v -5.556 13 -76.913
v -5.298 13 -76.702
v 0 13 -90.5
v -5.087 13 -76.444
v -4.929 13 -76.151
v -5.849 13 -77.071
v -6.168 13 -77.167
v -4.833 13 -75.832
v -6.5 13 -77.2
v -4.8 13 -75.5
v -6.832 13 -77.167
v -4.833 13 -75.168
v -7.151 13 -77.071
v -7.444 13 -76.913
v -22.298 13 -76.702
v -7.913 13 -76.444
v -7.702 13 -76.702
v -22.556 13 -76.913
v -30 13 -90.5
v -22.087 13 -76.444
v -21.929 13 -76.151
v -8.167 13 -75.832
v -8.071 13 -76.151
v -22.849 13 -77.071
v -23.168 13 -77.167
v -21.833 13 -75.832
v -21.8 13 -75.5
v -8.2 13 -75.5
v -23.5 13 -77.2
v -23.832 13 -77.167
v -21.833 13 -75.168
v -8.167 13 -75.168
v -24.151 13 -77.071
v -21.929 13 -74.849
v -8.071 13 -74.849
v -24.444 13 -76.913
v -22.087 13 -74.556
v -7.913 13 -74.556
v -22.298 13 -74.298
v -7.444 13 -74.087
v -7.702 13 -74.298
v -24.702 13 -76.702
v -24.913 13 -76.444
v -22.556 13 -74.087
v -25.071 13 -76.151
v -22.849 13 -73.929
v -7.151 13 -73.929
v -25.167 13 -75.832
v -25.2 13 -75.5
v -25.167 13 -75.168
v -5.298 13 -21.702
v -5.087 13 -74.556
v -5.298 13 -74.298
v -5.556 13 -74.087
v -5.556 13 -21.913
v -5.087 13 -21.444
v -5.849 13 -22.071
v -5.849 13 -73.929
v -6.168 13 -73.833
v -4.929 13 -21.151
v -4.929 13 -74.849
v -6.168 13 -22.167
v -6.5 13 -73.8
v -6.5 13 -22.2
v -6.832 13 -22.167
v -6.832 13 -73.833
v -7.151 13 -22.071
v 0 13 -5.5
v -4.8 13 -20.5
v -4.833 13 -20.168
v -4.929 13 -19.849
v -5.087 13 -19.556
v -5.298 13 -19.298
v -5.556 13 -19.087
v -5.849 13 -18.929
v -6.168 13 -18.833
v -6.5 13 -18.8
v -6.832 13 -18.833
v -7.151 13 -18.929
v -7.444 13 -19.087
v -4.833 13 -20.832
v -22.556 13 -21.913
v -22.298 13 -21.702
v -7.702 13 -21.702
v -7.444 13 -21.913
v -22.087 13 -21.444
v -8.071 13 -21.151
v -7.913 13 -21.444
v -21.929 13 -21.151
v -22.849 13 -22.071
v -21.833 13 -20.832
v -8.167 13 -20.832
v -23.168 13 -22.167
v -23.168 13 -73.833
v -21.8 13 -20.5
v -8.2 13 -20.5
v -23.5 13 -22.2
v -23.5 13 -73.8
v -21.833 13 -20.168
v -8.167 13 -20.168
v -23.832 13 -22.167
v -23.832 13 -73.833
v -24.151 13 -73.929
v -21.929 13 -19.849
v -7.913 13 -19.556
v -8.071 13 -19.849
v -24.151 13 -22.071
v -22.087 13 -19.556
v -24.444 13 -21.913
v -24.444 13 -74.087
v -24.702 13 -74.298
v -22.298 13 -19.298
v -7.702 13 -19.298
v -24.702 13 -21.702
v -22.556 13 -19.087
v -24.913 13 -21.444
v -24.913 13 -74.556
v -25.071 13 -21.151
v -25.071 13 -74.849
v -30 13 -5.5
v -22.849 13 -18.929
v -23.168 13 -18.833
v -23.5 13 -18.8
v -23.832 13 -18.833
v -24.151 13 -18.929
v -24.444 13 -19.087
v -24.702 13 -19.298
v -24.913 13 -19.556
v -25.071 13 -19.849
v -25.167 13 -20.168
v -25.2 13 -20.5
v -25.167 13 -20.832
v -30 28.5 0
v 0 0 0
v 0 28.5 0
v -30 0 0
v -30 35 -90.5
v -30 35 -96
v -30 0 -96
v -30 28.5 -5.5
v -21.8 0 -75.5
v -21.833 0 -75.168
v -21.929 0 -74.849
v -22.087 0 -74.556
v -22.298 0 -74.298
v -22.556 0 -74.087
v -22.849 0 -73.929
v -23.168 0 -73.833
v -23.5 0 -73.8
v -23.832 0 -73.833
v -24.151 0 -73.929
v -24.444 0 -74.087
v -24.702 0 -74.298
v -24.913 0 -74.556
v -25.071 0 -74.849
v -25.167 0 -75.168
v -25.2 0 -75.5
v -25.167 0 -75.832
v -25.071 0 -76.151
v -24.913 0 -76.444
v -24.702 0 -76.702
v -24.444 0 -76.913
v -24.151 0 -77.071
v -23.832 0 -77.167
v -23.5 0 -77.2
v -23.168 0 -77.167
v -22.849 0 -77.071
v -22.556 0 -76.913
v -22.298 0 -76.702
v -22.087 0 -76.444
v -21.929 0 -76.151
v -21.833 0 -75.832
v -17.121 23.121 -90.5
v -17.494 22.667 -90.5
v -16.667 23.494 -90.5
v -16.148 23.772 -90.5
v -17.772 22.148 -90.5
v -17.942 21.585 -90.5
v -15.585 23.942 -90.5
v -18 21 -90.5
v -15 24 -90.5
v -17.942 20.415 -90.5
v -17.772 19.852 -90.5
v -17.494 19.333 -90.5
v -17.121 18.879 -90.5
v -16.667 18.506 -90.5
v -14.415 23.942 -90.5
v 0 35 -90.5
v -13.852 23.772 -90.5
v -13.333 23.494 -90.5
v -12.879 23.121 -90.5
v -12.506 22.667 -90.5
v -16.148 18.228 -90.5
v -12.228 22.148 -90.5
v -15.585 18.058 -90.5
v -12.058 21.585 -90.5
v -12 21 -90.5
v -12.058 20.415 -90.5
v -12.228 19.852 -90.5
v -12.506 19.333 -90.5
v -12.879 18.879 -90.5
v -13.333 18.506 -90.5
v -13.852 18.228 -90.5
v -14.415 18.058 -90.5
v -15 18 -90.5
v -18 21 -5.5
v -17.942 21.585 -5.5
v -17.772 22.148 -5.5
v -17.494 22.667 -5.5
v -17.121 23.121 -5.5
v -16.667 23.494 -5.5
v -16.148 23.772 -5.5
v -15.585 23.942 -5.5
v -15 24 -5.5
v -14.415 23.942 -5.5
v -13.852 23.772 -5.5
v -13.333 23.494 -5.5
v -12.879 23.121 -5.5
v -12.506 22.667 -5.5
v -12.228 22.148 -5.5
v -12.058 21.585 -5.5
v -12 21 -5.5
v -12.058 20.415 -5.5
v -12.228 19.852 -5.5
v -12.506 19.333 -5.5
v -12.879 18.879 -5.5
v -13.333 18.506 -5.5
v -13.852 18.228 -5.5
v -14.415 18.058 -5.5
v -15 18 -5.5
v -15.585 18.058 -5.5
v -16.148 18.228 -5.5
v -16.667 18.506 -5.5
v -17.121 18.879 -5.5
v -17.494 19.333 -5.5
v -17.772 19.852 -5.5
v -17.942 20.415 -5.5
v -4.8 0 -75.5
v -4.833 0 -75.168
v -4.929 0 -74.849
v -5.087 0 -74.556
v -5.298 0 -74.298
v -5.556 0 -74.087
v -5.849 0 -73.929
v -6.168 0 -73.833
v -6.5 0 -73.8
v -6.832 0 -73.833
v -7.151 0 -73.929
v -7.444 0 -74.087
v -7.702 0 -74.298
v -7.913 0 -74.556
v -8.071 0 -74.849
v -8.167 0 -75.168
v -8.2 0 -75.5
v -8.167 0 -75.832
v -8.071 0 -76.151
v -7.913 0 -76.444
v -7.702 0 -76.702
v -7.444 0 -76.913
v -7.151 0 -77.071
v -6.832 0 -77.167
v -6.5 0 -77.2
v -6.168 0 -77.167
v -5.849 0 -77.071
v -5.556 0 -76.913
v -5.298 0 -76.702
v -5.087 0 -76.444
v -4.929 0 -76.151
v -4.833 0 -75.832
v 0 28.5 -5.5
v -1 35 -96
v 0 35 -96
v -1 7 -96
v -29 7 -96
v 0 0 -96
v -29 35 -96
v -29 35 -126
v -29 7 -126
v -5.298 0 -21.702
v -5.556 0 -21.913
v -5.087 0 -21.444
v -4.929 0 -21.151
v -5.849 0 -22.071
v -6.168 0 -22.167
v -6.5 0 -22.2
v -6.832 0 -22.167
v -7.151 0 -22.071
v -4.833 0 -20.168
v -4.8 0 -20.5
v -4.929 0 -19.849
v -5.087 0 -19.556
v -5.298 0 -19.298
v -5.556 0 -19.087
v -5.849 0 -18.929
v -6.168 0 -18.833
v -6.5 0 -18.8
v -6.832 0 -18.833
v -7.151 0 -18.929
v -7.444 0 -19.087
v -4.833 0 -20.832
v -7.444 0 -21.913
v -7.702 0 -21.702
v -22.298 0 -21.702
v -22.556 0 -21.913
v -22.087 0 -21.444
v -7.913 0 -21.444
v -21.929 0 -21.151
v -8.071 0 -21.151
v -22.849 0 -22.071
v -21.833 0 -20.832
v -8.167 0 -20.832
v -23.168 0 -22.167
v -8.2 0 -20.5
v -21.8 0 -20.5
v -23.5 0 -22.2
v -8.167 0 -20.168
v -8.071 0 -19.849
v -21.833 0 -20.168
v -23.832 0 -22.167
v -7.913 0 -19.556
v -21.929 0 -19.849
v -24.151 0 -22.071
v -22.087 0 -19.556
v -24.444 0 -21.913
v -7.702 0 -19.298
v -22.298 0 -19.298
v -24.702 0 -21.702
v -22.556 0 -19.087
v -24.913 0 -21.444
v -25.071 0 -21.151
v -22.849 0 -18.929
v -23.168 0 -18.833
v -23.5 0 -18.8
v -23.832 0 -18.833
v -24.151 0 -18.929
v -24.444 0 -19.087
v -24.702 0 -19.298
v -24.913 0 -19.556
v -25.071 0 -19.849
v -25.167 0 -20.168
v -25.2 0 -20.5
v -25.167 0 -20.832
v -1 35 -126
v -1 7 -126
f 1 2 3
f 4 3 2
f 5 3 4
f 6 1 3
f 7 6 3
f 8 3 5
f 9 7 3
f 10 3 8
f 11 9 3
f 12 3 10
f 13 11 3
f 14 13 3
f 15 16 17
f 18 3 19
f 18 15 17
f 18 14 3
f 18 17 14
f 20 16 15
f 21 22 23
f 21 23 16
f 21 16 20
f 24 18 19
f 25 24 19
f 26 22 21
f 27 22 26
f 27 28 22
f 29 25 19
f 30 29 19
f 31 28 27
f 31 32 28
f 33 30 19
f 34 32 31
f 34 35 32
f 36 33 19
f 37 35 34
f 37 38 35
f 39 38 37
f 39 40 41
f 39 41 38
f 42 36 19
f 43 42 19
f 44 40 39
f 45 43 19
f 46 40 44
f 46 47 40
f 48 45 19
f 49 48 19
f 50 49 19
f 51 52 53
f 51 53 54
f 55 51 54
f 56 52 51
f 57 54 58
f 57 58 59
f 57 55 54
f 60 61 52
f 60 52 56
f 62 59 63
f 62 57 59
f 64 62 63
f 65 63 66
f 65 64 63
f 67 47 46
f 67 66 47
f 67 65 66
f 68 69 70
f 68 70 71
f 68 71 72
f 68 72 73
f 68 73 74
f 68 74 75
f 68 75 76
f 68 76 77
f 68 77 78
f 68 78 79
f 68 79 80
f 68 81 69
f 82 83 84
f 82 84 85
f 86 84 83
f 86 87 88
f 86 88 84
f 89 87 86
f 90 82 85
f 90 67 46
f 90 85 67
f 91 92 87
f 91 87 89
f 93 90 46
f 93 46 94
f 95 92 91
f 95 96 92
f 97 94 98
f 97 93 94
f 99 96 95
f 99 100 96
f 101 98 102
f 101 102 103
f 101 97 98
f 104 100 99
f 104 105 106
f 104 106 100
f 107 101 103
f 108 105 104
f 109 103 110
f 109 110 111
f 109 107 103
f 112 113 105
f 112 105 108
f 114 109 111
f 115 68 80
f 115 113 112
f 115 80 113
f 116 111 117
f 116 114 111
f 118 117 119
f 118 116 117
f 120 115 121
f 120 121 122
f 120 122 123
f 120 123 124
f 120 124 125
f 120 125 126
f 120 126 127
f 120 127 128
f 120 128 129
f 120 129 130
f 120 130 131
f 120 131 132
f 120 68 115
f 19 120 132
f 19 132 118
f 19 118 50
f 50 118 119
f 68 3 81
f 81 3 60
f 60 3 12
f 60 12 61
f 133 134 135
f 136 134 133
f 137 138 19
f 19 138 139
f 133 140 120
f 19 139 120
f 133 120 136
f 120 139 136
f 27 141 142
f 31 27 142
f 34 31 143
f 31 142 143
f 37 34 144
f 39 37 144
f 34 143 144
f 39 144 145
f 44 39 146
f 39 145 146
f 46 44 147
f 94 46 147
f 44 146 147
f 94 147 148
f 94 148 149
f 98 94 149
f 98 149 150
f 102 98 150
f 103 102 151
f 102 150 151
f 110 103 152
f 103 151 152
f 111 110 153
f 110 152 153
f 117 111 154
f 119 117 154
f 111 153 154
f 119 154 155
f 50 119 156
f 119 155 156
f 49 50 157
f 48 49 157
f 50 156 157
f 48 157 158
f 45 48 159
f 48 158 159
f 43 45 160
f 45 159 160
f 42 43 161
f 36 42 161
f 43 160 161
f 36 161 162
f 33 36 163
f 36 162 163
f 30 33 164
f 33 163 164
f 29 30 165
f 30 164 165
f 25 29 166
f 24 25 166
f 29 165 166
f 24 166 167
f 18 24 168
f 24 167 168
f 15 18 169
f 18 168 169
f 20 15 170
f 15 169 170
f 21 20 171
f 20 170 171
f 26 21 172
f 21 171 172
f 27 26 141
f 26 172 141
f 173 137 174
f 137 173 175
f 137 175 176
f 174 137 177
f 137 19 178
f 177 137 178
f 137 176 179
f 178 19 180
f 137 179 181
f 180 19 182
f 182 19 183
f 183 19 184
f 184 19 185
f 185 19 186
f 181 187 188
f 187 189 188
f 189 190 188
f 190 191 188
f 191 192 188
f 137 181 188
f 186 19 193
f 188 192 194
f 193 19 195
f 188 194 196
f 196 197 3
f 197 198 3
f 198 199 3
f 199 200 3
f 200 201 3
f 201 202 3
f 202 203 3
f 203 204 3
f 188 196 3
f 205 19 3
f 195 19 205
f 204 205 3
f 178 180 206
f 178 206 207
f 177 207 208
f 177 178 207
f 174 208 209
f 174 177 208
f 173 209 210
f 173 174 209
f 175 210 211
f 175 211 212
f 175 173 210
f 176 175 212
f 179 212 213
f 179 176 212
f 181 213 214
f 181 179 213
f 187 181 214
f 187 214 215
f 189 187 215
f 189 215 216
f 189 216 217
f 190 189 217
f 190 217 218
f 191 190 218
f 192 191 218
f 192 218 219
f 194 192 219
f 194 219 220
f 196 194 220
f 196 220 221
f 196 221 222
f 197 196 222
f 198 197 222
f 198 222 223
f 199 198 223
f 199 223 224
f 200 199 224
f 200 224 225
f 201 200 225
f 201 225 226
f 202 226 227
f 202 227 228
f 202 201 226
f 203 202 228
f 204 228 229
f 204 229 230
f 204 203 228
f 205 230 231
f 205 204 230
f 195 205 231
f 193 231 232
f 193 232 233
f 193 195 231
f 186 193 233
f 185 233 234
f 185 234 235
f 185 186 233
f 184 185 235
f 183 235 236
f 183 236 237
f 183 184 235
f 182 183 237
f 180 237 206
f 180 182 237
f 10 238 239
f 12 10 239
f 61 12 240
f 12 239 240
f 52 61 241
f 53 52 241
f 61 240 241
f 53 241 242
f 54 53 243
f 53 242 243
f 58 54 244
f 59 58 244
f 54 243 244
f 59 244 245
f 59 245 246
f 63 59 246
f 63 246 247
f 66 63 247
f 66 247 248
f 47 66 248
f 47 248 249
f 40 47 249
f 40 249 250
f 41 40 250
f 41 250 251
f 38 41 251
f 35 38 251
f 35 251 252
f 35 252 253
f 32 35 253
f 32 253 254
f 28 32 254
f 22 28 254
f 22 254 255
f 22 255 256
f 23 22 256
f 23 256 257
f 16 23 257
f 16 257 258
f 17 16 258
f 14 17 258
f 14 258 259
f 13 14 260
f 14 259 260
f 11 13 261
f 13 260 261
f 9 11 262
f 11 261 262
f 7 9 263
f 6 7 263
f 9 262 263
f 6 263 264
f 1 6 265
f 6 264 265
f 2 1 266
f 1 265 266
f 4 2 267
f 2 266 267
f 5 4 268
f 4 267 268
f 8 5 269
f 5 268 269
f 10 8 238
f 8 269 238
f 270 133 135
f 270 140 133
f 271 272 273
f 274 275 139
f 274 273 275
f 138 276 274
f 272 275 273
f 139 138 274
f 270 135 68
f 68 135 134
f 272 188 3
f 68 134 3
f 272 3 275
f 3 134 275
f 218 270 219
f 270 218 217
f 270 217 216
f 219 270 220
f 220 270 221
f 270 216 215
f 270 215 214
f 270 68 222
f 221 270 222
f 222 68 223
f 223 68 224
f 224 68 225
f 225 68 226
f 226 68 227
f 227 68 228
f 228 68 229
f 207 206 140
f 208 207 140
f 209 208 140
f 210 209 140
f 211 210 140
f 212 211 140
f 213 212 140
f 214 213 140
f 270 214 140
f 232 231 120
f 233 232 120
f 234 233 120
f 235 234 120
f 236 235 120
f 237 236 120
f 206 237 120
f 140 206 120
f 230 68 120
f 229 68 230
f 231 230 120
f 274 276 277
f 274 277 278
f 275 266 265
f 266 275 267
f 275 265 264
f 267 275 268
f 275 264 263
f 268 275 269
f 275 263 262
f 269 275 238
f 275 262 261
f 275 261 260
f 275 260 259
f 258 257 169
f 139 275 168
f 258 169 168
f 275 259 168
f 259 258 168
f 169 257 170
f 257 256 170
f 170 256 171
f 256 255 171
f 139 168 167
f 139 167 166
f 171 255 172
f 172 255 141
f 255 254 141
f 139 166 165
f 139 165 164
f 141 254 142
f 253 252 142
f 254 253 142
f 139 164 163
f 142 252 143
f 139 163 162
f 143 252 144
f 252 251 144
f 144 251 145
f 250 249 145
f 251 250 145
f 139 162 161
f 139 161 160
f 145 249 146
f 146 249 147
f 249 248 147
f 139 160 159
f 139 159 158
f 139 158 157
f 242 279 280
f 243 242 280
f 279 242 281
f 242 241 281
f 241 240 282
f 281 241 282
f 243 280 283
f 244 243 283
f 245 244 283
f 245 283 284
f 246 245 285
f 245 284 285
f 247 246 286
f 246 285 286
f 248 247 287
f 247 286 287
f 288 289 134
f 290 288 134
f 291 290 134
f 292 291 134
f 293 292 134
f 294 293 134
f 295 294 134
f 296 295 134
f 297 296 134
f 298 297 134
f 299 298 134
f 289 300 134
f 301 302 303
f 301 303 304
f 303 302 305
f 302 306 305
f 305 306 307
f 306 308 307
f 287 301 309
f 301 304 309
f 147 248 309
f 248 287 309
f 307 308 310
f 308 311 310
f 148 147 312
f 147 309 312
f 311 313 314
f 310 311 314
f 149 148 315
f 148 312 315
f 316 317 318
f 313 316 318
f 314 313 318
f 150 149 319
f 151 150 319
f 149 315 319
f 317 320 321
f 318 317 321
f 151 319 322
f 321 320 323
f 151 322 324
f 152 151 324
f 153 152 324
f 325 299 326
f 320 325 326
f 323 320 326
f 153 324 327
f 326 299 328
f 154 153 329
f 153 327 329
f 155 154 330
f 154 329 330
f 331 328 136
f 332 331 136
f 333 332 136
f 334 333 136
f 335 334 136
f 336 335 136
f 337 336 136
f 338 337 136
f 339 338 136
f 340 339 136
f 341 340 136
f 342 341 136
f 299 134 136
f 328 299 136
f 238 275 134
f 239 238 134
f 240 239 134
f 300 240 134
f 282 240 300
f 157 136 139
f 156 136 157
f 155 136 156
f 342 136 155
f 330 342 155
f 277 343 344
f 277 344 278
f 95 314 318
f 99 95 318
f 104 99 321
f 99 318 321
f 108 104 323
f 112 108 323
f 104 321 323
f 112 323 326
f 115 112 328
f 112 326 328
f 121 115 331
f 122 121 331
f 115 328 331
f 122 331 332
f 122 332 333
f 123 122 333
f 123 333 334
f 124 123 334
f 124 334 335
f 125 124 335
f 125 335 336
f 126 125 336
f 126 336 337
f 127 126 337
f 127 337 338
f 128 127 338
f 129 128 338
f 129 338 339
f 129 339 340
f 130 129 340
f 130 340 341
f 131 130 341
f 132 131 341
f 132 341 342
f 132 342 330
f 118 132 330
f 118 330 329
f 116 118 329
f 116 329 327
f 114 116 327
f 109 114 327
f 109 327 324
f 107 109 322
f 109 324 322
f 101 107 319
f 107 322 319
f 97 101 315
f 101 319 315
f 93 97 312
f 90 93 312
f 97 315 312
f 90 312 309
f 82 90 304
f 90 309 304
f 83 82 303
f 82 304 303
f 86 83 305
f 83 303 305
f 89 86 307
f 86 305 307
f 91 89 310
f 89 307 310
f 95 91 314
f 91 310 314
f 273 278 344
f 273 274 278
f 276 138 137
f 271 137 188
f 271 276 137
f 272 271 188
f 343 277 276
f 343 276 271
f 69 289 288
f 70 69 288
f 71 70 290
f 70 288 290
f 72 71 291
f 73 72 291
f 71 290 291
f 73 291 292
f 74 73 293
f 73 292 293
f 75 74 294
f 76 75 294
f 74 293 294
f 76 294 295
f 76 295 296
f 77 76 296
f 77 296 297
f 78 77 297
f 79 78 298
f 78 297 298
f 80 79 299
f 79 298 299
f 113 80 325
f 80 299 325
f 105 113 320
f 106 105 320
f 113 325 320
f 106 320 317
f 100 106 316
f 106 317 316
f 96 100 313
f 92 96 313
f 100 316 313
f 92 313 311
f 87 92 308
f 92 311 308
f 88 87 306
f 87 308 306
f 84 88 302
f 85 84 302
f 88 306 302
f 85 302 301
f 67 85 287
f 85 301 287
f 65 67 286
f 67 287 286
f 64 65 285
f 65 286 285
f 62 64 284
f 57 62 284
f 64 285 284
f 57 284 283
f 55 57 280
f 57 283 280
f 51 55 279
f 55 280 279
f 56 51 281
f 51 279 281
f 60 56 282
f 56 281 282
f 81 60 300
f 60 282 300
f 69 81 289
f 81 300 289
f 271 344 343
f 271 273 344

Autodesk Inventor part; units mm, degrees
ref_plane "YZ Plane" through (0, 0, 0) normal (1, 0, 0) x (0, 1, 0)
ref_plane "XZ Plane" through (0, 0, 0) normal (0, 1, 0) x (-1, 0, 0)
ref_plane "XY Plane" through (0, 0, 0) normal (0, 0, 1) x (1, 0, 0)
sketch "Sketch1" plane through (0, 0, 0) normal (0, 1, 0) x (-1, 0, 0)
  line L0 (0, 0) -> (30, 0)
  line L1 (30, 0) -> (30, -96)
  line L2 (30, -96) -> (0, -96)
  line L3 (0, -96) -> (0, 0)
  dimension "d0" = 30
  dimension "d1" = 96
extrude "Extrusion1" add sketch "Sketch1" along normal blind 13
sketch "Sketch2" plane through (0, 13, 0) normal (0, 1, 0) x (1, 0, 0)
  line L0 (-30, 96) -> (-30, 0) projected
  line L1 (0, 0) -> (0, 96) projected
  line L2 (-30, 0) -> (0, 0)
  line L3 (0, 0) -> (0, 5.5)
  line L4 (0, 5.5) -> (-30, 5.5)
  line L5 (-30, 5.5) -> (-30, 0)
  line L6 (0, 96) -> (-30, 96)
  line L7 (-30, 96) -> (-30, 90.5)
  line L8 (-30, 90.5) -> (0, 90.5)
  line L9 (0, 90.5) -> (0, 96)
  line L10 (-30, 96) -> (0, 96)
  line L11 (0, 96) -> (0, 90.5)
  line L12 (0, 90.5) -> (-30, 90.5)
  line L13 (-30, 90.5) -> (-30, 96)
  dimension "d4" = 5.5
  dimension "d5" = 5.5
extrude "Extrusion2" add sketch "Sketch2" along normal blind 15.5 contours L4 L1 L2 L0
sketch "Sketch4" plane through (0, 13, 0) normal (0, 1, 0) x (1, 0, 0)
  line L0 (0, 0) -> (0, 96) projected
  line L1 (-30, 96) -> (-30, 0) projected
  line L2 (0, 96) -> (-30, 96)
  line L3 (-30, 96) -> (-30, 90.5)
  line L4 (-30, 90.5) -> (0, 90.5)
  line L5 (0, 90.5) -> (0, 96)
  point P0 (0, 90.5)
  dimension "d8" = 5.5
extrude "Extrusion3" add sketch "Sketch4" along normal blind 22
sketch "Sketch6" plane through (0, 0, -96) normal (0, 0, -1) x (-1, 0, 0)
  line L0 (30, 35) -> (0, 35) construction
  line L1 (30, 0) -> (30, 28.5) projected
  line L2 (0, 35) -> (30, 35) construction
  line L3 (30, 35) -> (30, 7) construction
  line L4 (30, 7) -> (0, 7) construction
  line L5 (0, 7) -> (0, 35) construction
  line L6 (0, 7) -> (30, 35) construction
  line L7 (0, 35) -> (30, 7) construction
  circle A0 centre (15, 21) radius 3
  point P0 (0, 0)
  dimension "d11" = 28
  dimension "d12" = 6
extrude "Extrusion4" add sketch "Sketch6" against normal up to surface (90.5 mm away)
sketch "Sketch7" plane through (0, 0, -96) normal (0, 0, -1) x (-1, 0, 0)
  line L0 (30, 0) -> (30, 28.5) projected
  line L1 (30, 35) -> (0, 35) projected
  line L2 (1, 35) -> (29, 35)
  line L3 (29, 35) -> (29, 7)
  line L4 (29, 7) -> (1, 7)
  line L5 (1, 7) -> (1, 35)
  point P0 (0, 0)
  point P1 (15, 35)
  dimension "d15" = 28
extrude "Extrusion5" add sketch "Sketch7" along normal blind 30
sketch "Sketch8" plane through (0, 0, 0) normal (0, -1, 0) x (1, 0, 0)
  circle A0 centre (-6.5, -75.5) radius 1.7
  circle A1 centre (-23.5, -75.5) radius 1.7
  circle A2 centre (-6.5, -20.5) radius 1.7
  circle A3 centre (-23.5, -20.5) radius 1.7
  line L0 (0, 0) -> (0, -96) projected
  line L1 (-30, 0) -> (0, 0) projected
  line L2 (-30, -96) -> (-30, 0) projected
  line L3 (0, -96) -> (-30, -96) projected
  dimension "d18" = 3.4
  dimension "d19" = 55
  dimension "d20" = 6.5
  dimension "d21" = 20.5
  dimension "d22" = 6.5
  dimension "d25" = 17
  dimension "d26" = 20.5
extrude "Extrusion6" cut sketch "Sketch8" against normal blind 30 contours A0 | A1 | A2 | A3
equation "\"d5\" = d4"
equation "\"d22\" = d20"
properties part number "AE_50MM_STAGE"
